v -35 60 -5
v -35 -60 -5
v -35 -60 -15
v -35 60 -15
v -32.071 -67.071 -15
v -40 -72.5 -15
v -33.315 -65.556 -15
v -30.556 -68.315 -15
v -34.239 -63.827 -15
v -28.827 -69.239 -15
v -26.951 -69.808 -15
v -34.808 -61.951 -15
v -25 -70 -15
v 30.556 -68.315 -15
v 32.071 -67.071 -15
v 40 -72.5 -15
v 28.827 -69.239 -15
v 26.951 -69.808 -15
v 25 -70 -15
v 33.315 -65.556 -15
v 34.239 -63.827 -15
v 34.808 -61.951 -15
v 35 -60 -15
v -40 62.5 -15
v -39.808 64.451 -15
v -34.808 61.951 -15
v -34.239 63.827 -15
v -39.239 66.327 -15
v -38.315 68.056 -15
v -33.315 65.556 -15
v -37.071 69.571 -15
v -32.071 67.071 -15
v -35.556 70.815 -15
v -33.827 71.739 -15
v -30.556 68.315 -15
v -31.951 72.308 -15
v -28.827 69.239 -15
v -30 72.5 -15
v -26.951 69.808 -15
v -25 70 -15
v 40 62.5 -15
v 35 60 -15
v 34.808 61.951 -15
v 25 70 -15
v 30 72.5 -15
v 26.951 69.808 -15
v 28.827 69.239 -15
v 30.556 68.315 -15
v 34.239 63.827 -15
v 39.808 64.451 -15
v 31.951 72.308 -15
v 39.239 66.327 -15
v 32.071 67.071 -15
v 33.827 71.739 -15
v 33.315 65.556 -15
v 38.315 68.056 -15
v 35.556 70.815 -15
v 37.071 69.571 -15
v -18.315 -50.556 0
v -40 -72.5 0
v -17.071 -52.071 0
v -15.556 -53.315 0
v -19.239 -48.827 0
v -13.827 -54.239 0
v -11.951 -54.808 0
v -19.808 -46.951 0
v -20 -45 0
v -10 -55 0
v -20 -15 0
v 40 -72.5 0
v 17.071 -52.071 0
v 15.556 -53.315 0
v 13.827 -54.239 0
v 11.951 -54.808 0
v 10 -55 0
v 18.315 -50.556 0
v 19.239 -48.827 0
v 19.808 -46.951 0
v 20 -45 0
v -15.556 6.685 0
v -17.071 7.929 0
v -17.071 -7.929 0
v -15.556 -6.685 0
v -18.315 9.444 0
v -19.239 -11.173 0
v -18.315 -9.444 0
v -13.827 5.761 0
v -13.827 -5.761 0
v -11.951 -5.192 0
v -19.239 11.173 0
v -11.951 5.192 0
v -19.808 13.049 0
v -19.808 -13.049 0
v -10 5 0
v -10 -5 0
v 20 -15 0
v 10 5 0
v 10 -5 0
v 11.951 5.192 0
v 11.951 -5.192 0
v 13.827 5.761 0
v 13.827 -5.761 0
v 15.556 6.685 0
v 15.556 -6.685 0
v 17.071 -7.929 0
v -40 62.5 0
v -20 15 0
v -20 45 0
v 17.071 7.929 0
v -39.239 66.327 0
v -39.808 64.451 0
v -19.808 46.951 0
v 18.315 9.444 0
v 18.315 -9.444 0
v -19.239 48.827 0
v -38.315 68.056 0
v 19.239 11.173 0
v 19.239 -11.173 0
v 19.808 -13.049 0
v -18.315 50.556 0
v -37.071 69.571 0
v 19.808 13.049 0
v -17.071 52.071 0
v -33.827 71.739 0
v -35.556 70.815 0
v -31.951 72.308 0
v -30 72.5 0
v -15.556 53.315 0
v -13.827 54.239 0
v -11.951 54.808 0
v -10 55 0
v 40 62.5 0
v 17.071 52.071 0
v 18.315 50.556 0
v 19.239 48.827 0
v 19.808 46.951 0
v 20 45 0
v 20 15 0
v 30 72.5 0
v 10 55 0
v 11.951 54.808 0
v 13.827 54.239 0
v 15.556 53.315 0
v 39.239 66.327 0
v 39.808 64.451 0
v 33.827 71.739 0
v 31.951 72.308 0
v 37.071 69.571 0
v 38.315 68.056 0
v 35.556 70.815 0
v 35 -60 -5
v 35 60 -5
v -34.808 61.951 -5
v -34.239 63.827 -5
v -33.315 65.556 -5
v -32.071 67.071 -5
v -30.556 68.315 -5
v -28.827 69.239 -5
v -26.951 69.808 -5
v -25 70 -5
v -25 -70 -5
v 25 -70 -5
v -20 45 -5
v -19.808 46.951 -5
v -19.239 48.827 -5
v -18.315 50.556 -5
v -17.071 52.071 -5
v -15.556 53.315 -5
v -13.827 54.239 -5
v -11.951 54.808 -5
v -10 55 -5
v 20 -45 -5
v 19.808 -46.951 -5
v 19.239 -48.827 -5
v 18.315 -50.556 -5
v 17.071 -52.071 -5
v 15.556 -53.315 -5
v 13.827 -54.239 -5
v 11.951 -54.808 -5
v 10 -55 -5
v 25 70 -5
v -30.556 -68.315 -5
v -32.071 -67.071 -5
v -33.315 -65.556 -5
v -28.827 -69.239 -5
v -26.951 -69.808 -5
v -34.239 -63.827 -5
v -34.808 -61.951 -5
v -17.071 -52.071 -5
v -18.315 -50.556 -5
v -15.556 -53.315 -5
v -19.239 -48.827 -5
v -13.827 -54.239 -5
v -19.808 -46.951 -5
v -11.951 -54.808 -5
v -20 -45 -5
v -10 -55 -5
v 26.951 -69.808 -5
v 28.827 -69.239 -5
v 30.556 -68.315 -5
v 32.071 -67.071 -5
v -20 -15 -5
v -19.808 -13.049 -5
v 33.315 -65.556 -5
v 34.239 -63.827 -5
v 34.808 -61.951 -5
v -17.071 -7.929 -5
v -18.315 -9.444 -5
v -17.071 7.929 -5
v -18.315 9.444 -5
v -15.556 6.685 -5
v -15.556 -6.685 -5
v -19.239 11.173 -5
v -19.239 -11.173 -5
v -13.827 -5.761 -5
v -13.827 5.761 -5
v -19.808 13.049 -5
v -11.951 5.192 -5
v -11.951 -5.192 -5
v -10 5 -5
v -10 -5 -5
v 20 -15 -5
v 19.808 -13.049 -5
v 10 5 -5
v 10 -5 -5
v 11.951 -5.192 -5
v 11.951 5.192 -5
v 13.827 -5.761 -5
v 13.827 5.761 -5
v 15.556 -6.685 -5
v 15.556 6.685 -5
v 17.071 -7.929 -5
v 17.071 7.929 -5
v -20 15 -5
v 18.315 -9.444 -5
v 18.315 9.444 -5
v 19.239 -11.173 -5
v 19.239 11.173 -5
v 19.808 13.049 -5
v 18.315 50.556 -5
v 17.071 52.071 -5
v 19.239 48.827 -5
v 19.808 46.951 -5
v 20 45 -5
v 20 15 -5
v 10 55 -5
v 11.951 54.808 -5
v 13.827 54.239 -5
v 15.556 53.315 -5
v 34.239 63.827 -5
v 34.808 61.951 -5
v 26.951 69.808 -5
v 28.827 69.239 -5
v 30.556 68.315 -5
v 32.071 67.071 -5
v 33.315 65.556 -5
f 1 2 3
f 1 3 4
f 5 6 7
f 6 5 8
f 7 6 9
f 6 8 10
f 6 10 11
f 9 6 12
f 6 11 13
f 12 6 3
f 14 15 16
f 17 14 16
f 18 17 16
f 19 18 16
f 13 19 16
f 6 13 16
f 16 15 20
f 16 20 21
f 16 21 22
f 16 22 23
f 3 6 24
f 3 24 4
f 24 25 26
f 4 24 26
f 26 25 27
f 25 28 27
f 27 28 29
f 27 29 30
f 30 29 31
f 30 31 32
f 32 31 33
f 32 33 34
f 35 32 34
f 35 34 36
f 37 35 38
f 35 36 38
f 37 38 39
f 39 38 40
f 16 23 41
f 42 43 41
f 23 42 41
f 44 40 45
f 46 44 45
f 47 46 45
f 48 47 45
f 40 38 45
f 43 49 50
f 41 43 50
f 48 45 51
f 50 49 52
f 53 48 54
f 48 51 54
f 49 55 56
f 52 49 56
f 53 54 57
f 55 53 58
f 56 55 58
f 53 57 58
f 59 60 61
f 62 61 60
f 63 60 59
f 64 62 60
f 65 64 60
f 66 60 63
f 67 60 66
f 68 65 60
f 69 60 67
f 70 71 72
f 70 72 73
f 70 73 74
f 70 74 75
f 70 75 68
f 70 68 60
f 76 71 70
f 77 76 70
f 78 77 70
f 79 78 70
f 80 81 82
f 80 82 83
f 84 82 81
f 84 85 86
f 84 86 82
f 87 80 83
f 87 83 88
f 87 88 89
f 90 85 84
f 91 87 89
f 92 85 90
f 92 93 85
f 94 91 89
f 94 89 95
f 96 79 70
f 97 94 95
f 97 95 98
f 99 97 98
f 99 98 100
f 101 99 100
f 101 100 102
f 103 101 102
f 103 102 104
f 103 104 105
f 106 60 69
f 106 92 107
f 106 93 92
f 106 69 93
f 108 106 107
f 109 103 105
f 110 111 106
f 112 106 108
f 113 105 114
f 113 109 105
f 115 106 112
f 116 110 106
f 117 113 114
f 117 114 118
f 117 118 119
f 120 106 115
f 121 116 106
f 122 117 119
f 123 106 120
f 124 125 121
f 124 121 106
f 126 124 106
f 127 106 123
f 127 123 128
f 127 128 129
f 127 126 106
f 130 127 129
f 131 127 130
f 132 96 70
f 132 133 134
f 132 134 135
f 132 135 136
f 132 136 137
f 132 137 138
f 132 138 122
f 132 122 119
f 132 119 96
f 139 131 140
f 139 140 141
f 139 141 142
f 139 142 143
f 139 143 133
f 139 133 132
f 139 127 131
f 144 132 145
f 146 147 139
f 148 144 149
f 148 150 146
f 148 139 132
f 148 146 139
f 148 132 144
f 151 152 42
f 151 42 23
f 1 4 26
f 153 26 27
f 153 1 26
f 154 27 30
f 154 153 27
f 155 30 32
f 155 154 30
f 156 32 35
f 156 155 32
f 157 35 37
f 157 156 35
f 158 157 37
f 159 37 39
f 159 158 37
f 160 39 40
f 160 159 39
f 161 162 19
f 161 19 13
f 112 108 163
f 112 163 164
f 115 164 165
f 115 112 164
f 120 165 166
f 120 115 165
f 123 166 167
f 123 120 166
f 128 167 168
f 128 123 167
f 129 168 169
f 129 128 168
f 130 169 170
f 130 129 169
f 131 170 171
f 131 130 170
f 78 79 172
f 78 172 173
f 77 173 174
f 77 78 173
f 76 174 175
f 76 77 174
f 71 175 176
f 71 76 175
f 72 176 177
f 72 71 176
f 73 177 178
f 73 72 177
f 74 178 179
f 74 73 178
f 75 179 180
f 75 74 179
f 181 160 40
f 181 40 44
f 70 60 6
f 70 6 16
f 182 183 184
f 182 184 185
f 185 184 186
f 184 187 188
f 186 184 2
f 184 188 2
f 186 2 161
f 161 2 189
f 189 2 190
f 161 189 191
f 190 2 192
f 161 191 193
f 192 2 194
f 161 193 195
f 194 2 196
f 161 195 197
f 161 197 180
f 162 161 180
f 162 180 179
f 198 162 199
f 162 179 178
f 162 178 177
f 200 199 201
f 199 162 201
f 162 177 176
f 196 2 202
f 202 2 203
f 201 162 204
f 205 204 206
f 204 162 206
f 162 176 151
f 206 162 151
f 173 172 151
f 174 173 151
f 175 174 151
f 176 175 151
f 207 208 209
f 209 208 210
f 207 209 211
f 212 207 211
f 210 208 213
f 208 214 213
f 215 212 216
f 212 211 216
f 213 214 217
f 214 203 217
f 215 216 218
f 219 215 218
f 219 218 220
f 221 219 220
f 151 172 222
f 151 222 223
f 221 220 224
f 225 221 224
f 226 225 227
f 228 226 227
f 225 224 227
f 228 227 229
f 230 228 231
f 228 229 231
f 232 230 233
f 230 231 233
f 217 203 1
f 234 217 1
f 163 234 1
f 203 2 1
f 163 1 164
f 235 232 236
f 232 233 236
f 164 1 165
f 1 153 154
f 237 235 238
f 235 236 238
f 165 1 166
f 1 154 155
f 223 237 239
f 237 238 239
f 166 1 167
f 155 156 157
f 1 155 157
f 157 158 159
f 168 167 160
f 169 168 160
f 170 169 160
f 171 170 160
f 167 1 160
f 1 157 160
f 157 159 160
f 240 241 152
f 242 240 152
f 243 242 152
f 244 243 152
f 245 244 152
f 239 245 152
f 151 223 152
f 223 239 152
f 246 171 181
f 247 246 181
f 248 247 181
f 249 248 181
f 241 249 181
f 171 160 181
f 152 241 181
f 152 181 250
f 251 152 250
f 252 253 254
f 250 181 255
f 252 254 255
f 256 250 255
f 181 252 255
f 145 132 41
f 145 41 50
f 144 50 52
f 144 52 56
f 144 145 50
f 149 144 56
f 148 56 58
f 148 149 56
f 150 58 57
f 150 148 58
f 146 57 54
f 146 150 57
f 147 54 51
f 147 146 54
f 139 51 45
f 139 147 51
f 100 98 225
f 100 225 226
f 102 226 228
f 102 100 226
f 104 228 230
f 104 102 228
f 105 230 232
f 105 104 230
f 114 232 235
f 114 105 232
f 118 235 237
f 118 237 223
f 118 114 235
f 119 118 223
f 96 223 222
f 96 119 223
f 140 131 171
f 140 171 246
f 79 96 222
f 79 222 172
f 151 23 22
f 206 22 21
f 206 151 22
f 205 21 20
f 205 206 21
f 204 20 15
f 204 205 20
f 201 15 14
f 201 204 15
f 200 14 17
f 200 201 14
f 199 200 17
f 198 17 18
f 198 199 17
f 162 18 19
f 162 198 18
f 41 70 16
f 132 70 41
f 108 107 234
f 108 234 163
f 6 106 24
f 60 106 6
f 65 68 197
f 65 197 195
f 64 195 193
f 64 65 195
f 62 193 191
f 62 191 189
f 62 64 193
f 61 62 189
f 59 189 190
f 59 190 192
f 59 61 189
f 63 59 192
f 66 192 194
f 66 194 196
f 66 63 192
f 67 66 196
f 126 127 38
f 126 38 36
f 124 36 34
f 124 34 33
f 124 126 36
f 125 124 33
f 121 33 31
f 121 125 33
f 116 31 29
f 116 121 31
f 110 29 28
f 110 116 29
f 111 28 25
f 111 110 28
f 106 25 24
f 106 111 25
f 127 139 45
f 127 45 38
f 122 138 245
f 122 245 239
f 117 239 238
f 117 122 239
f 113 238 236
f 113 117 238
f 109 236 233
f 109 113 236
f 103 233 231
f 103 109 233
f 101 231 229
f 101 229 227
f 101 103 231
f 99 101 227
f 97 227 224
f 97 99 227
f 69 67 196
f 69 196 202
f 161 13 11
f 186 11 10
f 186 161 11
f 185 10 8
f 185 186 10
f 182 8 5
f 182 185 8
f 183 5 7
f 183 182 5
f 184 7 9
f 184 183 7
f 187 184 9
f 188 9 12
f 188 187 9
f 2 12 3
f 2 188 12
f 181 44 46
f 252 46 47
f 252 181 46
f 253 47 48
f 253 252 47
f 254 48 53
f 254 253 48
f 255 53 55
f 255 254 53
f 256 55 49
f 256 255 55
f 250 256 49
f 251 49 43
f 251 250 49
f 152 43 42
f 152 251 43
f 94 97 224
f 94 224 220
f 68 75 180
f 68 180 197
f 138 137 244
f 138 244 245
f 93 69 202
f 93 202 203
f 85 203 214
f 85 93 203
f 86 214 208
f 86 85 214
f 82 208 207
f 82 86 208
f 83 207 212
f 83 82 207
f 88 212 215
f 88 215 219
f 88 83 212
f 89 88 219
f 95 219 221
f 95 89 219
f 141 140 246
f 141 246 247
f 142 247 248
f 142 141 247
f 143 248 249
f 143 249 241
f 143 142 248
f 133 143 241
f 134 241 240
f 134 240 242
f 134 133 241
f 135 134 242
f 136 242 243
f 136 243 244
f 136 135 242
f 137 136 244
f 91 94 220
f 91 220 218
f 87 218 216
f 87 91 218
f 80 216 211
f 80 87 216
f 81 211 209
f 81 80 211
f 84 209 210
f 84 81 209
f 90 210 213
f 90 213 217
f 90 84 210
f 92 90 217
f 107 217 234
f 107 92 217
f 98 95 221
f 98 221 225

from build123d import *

# Parameters (mm, degrees)
F1_DEPTH = 5
F2_DEPTH = 15


with BuildPart() as f1:
    # F0 (on Top) → F1 (new body)
    with BuildSketch(Plane.XY):
        with BuildLine():
            ThreePointArc((40, 62.5), (37.071068, 69.571068), (30, 72.5))
            Line((30, 72.5), (-30, 72.5))
            ThreePointArc((-30, 72.5), (-37.071068, 69.571068), (-40, 62.5))
            Line((-40, 62.5), (-40, -72.5))
            Line((-40, -72.5), (40, -72.5))
            Line((40, -72.5), (40, 62.5))
        make_face()
        with BuildLine():
            Line((-25, 70), (25, 70))
            ThreePointArc((25, 70), (32.071068, 67.071068), (35, 60))
            Line((35, 60), (35, -60))
            ThreePointArc((35, -60), (32.071068, -67.071068), (25, -70))
            Line((25, -70), (-25, -70))
            ThreePointArc((-25, -70), (-32.071068, -67.071068), (-35, -60))
            Line((-35, -60), (-35, 60))
            ThreePointArc((-35, 60), (-32.071068, 67.071068), (-25, 70))
        make_face(mode=Mode.SUBTRACT)
        with BuildLine():
            ThreePointArc((35, 60), (32.071068, 67.071068), (25, 70))
            Line((25, 70), (-25, 70))
            ThreePointArc((-25, 70), (-32.071068, 67.071068), (-35, 60))
            Line((-35, 60), (-35, -60))
            ThreePointArc((-35, -60), (-32.071068, -67.071068), (-25, -70))
            Line((-25, -70), (25, -70))
            ThreePointArc((25, -70), (32.071068, -67.071068), (35, -60))
            Line((35, -60), (35, 60))
        make_face()
        with BuildLine():
            ThreePointArc((20, -45), (17.071068, -52.071068), (10, -55))
            Line((10, -55), (-10, -55))
            ThreePointArc((-10, -55), (-17.071068, -52.071068), (-20, -45))
            Line((-20, -45), (-20, -15))
            ThreePointArc((-20, -15), (-17.071068, -7.928932), (-10, -5))
            Line((-10, -5), (10, -5))
            ThreePointArc((10, -5), (17.071068, -7.928932), (20, -15))
            Line((20, -15), (20, -45))
        make_face(mode=Mode.SUBTRACT)
        with BuildLine():
            Line((-10, 55), (10, 55))
            ThreePointArc((10, 55), (17.071068, 52.071068), (20, 45))
            Line((20, 45), (20, 15))
            ThreePointArc((20, 15), (17.071068, 7.928932), (10, 5))
            Line((10, 5), (-10, 5))
            ThreePointArc((-10, 5), (-17.071068, 7.928932), (-20, 15))
            Line((-20, 15), (-20, 45))
            ThreePointArc((-20, 45), (-17.071068, 52.071068), (-10, 55))
        make_face(mode=Mode.SUBTRACT)
    extrude(amount=-F1_DEPTH)

    # F0 (on Top) → F2 (join)
    with BuildSketch(Plane.XY):
        with BuildLine():
            ThreePointArc((40, 62.5), (37.071068, 69.571068), (30, 72.5))
            Line((30, 72.5), (-30, 72.5))
            ThreePointArc((-30, 72.5), (-37.071068, 69.571068), (-40, 62.5))
            Line((-40, 62.5), (-40, -72.5))
            Line((-40, -72.5), (40, -72.5))
            Line((40, -72.5), (40, 62.5))
        make_face()
        with BuildLine():
            Line((-25, 70), (25, 70))
            ThreePointArc((25, 70), (32.071068, 67.071068), (35, 60))
            Line((35, 60), (35, -60))
            ThreePointArc((35, -60), (32.071068, -67.071068), (25, -70))
            Line((25, -70), (-25, -70))
            ThreePointArc((-25, -70), (-32.071068, -67.071068), (-35, -60))
            Line((-35, -60), (-35, 60))
            ThreePointArc((-35, 60), (-32.071068, 67.071068), (-25, 70))
        make_face(mode=Mode.SUBTRACT)
    extrude(amount=-F2_DEPTH)


solid = f1.part
